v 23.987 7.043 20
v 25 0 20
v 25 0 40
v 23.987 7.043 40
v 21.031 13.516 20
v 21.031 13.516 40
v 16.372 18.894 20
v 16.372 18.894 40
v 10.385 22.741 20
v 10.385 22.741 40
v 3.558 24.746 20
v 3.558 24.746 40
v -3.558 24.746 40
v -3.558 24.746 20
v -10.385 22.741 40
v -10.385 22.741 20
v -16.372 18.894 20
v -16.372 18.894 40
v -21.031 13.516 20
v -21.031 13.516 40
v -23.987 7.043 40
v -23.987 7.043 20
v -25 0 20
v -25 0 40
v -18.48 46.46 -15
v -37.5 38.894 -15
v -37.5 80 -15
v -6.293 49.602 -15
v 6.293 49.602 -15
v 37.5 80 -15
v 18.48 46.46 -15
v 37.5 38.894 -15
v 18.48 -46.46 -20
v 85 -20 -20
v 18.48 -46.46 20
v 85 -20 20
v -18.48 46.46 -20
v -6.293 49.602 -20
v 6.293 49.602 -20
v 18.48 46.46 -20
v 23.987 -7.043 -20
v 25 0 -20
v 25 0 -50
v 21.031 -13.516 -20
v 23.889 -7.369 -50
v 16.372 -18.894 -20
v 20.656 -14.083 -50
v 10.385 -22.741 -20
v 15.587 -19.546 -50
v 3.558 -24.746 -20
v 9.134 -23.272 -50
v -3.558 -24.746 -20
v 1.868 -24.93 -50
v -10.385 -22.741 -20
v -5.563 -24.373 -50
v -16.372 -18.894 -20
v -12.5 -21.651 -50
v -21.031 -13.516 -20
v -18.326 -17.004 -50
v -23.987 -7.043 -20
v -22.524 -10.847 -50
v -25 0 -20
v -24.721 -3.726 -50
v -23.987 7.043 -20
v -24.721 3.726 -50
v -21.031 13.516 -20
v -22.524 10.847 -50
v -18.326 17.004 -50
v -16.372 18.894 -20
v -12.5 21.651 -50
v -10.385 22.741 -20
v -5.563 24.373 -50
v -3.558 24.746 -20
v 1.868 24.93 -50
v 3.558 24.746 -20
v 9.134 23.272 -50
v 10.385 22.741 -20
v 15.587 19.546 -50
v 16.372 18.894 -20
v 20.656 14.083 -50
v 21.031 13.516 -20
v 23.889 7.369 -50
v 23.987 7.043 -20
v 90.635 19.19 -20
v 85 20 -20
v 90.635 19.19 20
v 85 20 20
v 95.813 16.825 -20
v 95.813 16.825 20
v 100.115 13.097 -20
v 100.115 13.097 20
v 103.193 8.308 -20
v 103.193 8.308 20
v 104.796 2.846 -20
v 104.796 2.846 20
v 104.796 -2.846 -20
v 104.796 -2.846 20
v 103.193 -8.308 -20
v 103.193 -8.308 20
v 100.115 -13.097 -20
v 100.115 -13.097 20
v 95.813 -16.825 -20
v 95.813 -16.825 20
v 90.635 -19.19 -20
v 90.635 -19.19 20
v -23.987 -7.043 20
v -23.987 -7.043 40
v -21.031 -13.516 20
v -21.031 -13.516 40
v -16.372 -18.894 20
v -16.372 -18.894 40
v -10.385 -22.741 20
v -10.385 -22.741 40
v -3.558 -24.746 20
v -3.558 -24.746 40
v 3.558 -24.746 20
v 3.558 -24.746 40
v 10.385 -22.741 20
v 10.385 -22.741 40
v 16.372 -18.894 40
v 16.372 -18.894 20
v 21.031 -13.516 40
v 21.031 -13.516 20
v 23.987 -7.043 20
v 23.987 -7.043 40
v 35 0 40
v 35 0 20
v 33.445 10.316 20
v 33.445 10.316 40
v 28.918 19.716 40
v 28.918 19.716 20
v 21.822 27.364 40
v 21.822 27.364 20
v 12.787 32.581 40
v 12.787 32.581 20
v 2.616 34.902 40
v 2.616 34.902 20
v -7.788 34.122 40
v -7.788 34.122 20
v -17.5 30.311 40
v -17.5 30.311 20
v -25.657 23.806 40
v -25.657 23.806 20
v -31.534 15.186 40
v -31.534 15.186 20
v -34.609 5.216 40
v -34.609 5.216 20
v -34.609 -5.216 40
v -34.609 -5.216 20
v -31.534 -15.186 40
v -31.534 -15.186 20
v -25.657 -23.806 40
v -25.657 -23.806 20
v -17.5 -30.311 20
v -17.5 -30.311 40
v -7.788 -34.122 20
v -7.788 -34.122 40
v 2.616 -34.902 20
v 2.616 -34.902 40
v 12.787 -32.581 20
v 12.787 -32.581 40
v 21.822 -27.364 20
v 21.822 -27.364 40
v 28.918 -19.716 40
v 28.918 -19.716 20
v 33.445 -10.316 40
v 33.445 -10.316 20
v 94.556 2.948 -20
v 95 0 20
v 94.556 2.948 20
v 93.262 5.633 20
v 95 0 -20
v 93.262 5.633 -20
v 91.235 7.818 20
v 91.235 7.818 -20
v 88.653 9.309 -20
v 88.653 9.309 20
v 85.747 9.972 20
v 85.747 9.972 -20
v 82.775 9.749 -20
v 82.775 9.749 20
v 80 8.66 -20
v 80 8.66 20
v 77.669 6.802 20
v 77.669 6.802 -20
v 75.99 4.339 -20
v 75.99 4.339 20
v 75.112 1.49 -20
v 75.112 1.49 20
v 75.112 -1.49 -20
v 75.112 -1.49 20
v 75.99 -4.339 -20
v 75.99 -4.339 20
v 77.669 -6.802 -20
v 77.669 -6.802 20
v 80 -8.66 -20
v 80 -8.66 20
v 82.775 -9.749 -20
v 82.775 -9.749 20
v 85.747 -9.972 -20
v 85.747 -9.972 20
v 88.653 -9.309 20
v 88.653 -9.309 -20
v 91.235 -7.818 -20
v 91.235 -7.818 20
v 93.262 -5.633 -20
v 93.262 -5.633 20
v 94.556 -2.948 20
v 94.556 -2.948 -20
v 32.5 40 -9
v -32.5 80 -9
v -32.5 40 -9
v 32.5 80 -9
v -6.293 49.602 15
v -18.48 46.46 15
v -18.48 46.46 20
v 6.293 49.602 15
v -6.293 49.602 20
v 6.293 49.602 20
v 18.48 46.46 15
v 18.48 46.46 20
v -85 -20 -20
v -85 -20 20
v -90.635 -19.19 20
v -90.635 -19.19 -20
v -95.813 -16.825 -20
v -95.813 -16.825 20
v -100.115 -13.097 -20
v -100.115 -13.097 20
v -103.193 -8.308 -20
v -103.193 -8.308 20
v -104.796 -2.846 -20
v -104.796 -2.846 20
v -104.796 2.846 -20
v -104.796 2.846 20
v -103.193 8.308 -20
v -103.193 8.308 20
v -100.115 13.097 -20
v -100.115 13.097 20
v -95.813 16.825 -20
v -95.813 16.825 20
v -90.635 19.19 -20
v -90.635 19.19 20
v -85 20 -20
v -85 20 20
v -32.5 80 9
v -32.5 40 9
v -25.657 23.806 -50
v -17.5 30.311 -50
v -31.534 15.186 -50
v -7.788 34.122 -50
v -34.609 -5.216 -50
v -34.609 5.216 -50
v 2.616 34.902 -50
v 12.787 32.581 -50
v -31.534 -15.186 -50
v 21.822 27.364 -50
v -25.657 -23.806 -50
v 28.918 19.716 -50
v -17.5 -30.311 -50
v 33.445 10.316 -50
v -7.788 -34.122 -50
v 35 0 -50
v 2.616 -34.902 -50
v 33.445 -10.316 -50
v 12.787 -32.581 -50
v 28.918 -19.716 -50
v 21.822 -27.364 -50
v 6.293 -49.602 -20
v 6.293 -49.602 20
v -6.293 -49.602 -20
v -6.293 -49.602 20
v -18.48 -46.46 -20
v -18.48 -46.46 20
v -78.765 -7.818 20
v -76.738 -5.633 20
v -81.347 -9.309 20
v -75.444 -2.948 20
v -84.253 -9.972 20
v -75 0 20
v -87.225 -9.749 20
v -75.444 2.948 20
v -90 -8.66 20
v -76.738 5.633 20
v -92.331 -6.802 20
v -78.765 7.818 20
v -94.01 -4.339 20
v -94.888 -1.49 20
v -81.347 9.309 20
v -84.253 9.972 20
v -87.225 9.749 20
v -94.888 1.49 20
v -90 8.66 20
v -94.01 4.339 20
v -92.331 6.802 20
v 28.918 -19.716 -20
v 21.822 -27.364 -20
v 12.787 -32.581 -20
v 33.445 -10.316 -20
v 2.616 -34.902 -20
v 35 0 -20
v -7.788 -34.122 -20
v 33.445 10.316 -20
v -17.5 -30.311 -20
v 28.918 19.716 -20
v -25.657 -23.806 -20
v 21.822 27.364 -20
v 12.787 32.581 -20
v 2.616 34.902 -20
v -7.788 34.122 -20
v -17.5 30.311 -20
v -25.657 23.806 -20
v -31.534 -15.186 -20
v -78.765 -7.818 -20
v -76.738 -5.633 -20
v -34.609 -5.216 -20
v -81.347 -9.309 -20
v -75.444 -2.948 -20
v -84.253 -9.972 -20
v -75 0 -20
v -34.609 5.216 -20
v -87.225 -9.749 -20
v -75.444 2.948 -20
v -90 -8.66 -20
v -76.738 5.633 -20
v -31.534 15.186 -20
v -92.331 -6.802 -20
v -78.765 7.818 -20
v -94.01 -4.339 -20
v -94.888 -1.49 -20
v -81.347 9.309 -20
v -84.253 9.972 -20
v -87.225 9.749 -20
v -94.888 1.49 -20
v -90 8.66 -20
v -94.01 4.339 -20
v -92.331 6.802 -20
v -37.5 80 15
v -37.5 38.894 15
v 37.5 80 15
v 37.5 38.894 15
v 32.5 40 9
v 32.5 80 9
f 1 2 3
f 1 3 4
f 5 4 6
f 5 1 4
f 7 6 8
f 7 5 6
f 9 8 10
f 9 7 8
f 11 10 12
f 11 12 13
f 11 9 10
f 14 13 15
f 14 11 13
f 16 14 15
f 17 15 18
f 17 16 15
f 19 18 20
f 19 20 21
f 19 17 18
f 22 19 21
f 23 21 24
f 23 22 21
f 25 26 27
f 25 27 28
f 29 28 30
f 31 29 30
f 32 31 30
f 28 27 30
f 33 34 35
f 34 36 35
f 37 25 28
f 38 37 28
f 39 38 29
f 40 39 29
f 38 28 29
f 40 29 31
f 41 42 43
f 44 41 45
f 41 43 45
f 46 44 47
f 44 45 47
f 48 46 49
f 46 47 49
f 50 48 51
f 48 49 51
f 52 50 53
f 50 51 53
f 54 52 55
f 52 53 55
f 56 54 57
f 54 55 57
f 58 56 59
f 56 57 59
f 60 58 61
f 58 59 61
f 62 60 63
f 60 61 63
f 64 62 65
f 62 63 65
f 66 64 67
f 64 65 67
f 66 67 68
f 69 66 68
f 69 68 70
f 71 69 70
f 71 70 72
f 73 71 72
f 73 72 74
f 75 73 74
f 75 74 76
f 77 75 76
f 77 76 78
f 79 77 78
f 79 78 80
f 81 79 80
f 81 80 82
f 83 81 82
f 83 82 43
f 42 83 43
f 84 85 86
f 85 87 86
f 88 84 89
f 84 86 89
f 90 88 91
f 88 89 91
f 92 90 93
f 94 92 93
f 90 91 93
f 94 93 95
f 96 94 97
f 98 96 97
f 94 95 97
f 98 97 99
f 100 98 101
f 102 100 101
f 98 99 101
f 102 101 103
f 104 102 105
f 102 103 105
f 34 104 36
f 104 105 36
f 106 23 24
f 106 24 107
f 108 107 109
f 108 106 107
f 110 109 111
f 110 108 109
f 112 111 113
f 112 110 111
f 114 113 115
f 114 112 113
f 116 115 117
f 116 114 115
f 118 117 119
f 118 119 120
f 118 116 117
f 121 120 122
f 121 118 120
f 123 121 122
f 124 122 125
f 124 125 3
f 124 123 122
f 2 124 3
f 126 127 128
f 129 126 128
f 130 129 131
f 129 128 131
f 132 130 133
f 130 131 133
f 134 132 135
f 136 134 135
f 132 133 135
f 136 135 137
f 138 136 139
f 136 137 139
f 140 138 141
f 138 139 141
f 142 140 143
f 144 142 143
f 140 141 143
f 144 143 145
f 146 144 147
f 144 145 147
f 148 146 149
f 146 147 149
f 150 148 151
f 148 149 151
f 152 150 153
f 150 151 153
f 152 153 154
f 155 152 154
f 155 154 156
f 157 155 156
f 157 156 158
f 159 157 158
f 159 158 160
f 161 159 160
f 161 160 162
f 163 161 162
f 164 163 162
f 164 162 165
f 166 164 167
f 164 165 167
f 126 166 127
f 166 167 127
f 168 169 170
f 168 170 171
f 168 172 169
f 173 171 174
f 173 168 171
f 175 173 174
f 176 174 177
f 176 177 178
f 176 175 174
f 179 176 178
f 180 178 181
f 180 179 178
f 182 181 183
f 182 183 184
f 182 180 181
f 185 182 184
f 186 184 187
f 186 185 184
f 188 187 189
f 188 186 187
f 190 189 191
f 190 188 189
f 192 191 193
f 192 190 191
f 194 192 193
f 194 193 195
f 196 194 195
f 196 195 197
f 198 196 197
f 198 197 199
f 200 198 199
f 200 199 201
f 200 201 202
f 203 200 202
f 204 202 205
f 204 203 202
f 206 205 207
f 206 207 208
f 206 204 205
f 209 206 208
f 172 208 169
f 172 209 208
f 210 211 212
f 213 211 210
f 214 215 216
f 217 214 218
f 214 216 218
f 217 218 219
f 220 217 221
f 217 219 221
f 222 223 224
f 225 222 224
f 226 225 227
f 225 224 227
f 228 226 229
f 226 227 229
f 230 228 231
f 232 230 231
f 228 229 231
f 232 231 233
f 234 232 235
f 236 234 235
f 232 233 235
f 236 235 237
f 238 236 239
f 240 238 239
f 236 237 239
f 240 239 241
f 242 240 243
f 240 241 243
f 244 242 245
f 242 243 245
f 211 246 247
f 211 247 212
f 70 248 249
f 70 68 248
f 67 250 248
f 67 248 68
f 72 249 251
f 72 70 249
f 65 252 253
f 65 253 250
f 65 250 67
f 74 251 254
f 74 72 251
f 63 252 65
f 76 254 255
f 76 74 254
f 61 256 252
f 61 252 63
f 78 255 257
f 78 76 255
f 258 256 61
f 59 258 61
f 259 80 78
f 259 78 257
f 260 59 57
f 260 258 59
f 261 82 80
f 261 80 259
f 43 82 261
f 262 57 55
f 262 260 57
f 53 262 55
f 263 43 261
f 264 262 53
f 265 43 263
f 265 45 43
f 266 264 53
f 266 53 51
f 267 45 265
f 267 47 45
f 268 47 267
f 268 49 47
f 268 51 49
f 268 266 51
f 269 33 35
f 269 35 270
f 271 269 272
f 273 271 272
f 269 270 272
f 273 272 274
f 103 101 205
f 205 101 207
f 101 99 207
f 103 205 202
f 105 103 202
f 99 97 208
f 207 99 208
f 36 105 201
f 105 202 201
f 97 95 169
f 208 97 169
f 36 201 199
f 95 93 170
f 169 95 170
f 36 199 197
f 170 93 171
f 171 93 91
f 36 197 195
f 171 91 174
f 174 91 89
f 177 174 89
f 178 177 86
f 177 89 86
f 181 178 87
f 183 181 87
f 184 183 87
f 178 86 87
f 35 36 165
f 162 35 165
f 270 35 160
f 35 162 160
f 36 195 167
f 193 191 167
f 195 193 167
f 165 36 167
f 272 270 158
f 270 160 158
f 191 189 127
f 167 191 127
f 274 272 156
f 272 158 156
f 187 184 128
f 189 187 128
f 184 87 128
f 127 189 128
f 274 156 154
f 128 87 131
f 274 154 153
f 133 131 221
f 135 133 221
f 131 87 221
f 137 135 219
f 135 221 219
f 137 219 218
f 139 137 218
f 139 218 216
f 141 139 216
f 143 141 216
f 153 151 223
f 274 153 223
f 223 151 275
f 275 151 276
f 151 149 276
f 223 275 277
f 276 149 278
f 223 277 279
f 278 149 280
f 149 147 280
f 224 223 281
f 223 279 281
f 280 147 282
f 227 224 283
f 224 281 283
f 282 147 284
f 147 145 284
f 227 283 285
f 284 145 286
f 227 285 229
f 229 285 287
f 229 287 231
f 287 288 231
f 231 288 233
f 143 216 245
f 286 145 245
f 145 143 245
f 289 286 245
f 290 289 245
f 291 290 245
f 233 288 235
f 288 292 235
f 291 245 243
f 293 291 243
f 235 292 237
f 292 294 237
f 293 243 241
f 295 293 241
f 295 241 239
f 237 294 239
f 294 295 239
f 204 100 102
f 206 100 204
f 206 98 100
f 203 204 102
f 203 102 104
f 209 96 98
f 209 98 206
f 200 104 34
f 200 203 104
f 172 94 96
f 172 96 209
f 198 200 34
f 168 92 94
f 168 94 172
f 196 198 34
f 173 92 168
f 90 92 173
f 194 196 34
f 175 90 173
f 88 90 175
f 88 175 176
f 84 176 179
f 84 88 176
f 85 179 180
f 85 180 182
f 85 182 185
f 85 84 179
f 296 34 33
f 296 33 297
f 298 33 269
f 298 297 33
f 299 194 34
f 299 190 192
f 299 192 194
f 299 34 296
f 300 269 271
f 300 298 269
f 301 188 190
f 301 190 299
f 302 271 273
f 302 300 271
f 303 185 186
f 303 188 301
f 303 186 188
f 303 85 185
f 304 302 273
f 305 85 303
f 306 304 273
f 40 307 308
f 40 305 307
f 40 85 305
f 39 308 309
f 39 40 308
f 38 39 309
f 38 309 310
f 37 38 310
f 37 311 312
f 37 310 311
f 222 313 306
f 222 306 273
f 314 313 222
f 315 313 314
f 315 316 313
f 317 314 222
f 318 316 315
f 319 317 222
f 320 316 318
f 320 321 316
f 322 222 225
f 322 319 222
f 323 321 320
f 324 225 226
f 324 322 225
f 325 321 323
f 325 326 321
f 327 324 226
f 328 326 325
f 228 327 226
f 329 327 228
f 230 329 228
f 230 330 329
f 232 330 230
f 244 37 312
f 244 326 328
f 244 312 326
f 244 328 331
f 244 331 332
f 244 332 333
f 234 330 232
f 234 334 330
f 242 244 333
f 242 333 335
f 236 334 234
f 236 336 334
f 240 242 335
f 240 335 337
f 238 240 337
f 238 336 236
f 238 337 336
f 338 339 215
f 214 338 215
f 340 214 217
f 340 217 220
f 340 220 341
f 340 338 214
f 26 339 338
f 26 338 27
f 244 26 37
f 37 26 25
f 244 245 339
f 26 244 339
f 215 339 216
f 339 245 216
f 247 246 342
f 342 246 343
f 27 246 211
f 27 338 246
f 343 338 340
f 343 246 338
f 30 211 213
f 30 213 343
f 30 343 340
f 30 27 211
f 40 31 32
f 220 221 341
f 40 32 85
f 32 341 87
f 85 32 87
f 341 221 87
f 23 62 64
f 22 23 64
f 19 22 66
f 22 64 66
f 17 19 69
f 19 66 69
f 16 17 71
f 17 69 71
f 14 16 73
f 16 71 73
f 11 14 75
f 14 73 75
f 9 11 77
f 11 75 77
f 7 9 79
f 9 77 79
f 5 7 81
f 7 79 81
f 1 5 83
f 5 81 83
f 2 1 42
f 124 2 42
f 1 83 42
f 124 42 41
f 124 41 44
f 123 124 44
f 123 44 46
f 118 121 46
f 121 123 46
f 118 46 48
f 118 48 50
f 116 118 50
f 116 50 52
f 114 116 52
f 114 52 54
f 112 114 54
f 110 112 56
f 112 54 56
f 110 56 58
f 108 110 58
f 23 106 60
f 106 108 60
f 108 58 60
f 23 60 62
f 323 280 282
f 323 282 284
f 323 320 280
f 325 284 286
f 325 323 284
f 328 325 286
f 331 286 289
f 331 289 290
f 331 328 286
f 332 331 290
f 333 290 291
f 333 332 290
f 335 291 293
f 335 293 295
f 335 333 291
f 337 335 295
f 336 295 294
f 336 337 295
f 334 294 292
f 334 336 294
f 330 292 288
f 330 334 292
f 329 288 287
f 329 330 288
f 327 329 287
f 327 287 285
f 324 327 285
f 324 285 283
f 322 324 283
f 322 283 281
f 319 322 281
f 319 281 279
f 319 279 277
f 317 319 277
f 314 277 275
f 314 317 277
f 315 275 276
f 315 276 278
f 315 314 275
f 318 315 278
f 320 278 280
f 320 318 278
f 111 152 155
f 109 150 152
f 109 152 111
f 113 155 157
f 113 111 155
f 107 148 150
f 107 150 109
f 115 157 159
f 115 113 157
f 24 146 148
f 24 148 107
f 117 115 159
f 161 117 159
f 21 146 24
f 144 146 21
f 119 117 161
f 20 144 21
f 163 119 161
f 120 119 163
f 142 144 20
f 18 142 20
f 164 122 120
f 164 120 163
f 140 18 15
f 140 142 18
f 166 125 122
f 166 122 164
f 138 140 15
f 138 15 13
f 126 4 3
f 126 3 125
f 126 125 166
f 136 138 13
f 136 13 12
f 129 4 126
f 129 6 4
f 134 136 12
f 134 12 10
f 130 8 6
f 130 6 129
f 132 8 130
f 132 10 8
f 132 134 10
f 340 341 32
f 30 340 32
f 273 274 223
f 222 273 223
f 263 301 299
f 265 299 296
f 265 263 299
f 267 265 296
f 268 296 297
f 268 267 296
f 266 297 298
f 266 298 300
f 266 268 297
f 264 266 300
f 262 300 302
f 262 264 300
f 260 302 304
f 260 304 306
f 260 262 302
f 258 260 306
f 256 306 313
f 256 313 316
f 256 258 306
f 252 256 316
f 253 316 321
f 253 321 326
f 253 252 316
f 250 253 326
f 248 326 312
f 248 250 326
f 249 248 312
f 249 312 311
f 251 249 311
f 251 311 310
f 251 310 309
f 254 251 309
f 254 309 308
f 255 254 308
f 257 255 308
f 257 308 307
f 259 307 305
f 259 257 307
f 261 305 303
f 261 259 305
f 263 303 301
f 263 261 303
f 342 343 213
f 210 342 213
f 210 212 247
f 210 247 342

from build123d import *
from build123d.topology import SkipClean

# Parameters (mm, degrees)
SKETCH1_R                = 10
BOSS_EXTRUDE1_DEPTH      = 20
SKETCH2_R                = 35
SKETCH2_R_2              = 25
BOSS_EXTRUDE2_DEPTH      = 20
BOSS_EXTRUDE3_START      = 30
SKETCH3_R                = 35
SKETCH3_R_2              = 25
BOSS_EXTRUDE3_DEPTH      = 30
SKETCH4_R                = 25
CUT_EXTRUDE1_DEPTH       = 131.862523283
BOSS_EXTRUDE6_REACH      = 176.428
BOSS_EXTRUDE6_END_RADIUS = 50
SKETCH6_W                = 75
SKETCH6_H                = 30
SKETCH7_W                = 65
SKETCH7_H                = 18
CUT_EXTRUDE2_DEPTH       = 40


with BuildPart() as part:
    # Sketch1 → Boss-Extrude1 (new, symmetric)
    with BuildSketch(Plane.XY):
        with BuildLine():
            Line((-85, 20), (-18.480117336, 46.459501324))
            ThreePointArc((-18.480117336, 46.459501324), (0, 50), (18.480117336, 46.459501324))
            Line((18.480117336, 46.459501324), (85, 20))
            ThreePointArc((85, 20), (105, 0), (85, -20))
            Line((85, -20), (18.480117336, -46.459501324))
            ThreePointArc((18.480117336, -46.459501324), (0, -50), (-18.480117336, -46.459501324))
            Line((-18.480117336, -46.459501324), (-85, -20))
            ThreePointArc((-85, -20), (-105, 0), (-85, 20))
        make_face()
        with Locations((-85, 0)):
            Circle(SKETCH1_R, mode=Mode.SUBTRACT)
        with Locations((85, 0)):
            Circle(SKETCH1_R, mode=Mode.SUBTRACT)
    extrude(amount=BOSS_EXTRUDE1_DEPTH, both=True)

    # Sketch2 → Boss-Extrude2 (add)
    with BuildSketch(Plane.XY.offset(20)):
        Circle(SKETCH2_R)
        Circle(SKETCH2_R_2, mode=Mode.SUBTRACT)
    extrude(amount=BOSS_EXTRUDE2_DEPTH)

    # Sketch3 → Boss-Extrude3 (add)
    with BuildSketch(Plane(origin=(0, 0, -20), x_dir=(-1, 0, 0), z_dir=(0, 0, -1)).offset(BOSS_EXTRUDE3_START)):
        Circle(SKETCH3_R)
        Circle(SKETCH3_R_2, mode=Mode.SUBTRACT)
    extrude(amount=-BOSS_EXTRUDE3_DEPTH)

    # Sketch4 → Cut-Extrude1 (cut, through all)
    with BuildSketch(Plane(origin=(0, 0, -20), x_dir=(-1, 0, 0), z_dir=(0, 0, -1))):
        Circle(SKETCH4_R)
    extrude(amount=-CUT_EXTRUDE1_DEPTH, mode=Mode.SUBTRACT)

    # Boss-Extrude6: up to this cylinder (the profile starts outside it)
    with SkipClean():  # the faces are left unmerged after this step: merging them gives an invalid solid
        boss_extrude6_end = Plane(origin=(0, 0, 0), z_dir=(0, 0, -1)) * Cylinder(BOSS_EXTRUDE6_END_RADIUS, 453.856, mode=Mode.PRIVATE)
        # Sketch6 → Boss-Extrude6 (add, up to the surface)
        with BuildSketch(Plane(origin=(0, 80, 0), x_dir=(1, 0, 0), z_dir=(0, 1, 0)), mode=Mode.PRIVATE) as boss_extrude6_sk1:
            Rectangle(SKETCH6_W, SKETCH6_H)
        boss_extrude6_tool1 = extrude(boss_extrude6_sk1.sketch, amount=-BOSS_EXTRUDE6_REACH, mode=Mode.PRIVATE) - boss_extrude6_end
        add(boss_extrude6_tool1.solids().sort_by_distance((0, 80, 0))[0])
    add(part.part.scale(1), mode=Mode.REPLACE)  # the faces are merged on a copy

    # Sketch7 → Cut-Extrude2 (cut)
    with BuildSketch(Plane(origin=(0, 80, 0), x_dir=(1, 0, 0), z_dir=(0, 1, 0))):
        Rectangle(SKETCH7_W, SKETCH7_H)
    extrude(amount=-CUT_EXTRUDE2_DEPTH, mode=Mode.SUBTRACT)


solid = part.part
